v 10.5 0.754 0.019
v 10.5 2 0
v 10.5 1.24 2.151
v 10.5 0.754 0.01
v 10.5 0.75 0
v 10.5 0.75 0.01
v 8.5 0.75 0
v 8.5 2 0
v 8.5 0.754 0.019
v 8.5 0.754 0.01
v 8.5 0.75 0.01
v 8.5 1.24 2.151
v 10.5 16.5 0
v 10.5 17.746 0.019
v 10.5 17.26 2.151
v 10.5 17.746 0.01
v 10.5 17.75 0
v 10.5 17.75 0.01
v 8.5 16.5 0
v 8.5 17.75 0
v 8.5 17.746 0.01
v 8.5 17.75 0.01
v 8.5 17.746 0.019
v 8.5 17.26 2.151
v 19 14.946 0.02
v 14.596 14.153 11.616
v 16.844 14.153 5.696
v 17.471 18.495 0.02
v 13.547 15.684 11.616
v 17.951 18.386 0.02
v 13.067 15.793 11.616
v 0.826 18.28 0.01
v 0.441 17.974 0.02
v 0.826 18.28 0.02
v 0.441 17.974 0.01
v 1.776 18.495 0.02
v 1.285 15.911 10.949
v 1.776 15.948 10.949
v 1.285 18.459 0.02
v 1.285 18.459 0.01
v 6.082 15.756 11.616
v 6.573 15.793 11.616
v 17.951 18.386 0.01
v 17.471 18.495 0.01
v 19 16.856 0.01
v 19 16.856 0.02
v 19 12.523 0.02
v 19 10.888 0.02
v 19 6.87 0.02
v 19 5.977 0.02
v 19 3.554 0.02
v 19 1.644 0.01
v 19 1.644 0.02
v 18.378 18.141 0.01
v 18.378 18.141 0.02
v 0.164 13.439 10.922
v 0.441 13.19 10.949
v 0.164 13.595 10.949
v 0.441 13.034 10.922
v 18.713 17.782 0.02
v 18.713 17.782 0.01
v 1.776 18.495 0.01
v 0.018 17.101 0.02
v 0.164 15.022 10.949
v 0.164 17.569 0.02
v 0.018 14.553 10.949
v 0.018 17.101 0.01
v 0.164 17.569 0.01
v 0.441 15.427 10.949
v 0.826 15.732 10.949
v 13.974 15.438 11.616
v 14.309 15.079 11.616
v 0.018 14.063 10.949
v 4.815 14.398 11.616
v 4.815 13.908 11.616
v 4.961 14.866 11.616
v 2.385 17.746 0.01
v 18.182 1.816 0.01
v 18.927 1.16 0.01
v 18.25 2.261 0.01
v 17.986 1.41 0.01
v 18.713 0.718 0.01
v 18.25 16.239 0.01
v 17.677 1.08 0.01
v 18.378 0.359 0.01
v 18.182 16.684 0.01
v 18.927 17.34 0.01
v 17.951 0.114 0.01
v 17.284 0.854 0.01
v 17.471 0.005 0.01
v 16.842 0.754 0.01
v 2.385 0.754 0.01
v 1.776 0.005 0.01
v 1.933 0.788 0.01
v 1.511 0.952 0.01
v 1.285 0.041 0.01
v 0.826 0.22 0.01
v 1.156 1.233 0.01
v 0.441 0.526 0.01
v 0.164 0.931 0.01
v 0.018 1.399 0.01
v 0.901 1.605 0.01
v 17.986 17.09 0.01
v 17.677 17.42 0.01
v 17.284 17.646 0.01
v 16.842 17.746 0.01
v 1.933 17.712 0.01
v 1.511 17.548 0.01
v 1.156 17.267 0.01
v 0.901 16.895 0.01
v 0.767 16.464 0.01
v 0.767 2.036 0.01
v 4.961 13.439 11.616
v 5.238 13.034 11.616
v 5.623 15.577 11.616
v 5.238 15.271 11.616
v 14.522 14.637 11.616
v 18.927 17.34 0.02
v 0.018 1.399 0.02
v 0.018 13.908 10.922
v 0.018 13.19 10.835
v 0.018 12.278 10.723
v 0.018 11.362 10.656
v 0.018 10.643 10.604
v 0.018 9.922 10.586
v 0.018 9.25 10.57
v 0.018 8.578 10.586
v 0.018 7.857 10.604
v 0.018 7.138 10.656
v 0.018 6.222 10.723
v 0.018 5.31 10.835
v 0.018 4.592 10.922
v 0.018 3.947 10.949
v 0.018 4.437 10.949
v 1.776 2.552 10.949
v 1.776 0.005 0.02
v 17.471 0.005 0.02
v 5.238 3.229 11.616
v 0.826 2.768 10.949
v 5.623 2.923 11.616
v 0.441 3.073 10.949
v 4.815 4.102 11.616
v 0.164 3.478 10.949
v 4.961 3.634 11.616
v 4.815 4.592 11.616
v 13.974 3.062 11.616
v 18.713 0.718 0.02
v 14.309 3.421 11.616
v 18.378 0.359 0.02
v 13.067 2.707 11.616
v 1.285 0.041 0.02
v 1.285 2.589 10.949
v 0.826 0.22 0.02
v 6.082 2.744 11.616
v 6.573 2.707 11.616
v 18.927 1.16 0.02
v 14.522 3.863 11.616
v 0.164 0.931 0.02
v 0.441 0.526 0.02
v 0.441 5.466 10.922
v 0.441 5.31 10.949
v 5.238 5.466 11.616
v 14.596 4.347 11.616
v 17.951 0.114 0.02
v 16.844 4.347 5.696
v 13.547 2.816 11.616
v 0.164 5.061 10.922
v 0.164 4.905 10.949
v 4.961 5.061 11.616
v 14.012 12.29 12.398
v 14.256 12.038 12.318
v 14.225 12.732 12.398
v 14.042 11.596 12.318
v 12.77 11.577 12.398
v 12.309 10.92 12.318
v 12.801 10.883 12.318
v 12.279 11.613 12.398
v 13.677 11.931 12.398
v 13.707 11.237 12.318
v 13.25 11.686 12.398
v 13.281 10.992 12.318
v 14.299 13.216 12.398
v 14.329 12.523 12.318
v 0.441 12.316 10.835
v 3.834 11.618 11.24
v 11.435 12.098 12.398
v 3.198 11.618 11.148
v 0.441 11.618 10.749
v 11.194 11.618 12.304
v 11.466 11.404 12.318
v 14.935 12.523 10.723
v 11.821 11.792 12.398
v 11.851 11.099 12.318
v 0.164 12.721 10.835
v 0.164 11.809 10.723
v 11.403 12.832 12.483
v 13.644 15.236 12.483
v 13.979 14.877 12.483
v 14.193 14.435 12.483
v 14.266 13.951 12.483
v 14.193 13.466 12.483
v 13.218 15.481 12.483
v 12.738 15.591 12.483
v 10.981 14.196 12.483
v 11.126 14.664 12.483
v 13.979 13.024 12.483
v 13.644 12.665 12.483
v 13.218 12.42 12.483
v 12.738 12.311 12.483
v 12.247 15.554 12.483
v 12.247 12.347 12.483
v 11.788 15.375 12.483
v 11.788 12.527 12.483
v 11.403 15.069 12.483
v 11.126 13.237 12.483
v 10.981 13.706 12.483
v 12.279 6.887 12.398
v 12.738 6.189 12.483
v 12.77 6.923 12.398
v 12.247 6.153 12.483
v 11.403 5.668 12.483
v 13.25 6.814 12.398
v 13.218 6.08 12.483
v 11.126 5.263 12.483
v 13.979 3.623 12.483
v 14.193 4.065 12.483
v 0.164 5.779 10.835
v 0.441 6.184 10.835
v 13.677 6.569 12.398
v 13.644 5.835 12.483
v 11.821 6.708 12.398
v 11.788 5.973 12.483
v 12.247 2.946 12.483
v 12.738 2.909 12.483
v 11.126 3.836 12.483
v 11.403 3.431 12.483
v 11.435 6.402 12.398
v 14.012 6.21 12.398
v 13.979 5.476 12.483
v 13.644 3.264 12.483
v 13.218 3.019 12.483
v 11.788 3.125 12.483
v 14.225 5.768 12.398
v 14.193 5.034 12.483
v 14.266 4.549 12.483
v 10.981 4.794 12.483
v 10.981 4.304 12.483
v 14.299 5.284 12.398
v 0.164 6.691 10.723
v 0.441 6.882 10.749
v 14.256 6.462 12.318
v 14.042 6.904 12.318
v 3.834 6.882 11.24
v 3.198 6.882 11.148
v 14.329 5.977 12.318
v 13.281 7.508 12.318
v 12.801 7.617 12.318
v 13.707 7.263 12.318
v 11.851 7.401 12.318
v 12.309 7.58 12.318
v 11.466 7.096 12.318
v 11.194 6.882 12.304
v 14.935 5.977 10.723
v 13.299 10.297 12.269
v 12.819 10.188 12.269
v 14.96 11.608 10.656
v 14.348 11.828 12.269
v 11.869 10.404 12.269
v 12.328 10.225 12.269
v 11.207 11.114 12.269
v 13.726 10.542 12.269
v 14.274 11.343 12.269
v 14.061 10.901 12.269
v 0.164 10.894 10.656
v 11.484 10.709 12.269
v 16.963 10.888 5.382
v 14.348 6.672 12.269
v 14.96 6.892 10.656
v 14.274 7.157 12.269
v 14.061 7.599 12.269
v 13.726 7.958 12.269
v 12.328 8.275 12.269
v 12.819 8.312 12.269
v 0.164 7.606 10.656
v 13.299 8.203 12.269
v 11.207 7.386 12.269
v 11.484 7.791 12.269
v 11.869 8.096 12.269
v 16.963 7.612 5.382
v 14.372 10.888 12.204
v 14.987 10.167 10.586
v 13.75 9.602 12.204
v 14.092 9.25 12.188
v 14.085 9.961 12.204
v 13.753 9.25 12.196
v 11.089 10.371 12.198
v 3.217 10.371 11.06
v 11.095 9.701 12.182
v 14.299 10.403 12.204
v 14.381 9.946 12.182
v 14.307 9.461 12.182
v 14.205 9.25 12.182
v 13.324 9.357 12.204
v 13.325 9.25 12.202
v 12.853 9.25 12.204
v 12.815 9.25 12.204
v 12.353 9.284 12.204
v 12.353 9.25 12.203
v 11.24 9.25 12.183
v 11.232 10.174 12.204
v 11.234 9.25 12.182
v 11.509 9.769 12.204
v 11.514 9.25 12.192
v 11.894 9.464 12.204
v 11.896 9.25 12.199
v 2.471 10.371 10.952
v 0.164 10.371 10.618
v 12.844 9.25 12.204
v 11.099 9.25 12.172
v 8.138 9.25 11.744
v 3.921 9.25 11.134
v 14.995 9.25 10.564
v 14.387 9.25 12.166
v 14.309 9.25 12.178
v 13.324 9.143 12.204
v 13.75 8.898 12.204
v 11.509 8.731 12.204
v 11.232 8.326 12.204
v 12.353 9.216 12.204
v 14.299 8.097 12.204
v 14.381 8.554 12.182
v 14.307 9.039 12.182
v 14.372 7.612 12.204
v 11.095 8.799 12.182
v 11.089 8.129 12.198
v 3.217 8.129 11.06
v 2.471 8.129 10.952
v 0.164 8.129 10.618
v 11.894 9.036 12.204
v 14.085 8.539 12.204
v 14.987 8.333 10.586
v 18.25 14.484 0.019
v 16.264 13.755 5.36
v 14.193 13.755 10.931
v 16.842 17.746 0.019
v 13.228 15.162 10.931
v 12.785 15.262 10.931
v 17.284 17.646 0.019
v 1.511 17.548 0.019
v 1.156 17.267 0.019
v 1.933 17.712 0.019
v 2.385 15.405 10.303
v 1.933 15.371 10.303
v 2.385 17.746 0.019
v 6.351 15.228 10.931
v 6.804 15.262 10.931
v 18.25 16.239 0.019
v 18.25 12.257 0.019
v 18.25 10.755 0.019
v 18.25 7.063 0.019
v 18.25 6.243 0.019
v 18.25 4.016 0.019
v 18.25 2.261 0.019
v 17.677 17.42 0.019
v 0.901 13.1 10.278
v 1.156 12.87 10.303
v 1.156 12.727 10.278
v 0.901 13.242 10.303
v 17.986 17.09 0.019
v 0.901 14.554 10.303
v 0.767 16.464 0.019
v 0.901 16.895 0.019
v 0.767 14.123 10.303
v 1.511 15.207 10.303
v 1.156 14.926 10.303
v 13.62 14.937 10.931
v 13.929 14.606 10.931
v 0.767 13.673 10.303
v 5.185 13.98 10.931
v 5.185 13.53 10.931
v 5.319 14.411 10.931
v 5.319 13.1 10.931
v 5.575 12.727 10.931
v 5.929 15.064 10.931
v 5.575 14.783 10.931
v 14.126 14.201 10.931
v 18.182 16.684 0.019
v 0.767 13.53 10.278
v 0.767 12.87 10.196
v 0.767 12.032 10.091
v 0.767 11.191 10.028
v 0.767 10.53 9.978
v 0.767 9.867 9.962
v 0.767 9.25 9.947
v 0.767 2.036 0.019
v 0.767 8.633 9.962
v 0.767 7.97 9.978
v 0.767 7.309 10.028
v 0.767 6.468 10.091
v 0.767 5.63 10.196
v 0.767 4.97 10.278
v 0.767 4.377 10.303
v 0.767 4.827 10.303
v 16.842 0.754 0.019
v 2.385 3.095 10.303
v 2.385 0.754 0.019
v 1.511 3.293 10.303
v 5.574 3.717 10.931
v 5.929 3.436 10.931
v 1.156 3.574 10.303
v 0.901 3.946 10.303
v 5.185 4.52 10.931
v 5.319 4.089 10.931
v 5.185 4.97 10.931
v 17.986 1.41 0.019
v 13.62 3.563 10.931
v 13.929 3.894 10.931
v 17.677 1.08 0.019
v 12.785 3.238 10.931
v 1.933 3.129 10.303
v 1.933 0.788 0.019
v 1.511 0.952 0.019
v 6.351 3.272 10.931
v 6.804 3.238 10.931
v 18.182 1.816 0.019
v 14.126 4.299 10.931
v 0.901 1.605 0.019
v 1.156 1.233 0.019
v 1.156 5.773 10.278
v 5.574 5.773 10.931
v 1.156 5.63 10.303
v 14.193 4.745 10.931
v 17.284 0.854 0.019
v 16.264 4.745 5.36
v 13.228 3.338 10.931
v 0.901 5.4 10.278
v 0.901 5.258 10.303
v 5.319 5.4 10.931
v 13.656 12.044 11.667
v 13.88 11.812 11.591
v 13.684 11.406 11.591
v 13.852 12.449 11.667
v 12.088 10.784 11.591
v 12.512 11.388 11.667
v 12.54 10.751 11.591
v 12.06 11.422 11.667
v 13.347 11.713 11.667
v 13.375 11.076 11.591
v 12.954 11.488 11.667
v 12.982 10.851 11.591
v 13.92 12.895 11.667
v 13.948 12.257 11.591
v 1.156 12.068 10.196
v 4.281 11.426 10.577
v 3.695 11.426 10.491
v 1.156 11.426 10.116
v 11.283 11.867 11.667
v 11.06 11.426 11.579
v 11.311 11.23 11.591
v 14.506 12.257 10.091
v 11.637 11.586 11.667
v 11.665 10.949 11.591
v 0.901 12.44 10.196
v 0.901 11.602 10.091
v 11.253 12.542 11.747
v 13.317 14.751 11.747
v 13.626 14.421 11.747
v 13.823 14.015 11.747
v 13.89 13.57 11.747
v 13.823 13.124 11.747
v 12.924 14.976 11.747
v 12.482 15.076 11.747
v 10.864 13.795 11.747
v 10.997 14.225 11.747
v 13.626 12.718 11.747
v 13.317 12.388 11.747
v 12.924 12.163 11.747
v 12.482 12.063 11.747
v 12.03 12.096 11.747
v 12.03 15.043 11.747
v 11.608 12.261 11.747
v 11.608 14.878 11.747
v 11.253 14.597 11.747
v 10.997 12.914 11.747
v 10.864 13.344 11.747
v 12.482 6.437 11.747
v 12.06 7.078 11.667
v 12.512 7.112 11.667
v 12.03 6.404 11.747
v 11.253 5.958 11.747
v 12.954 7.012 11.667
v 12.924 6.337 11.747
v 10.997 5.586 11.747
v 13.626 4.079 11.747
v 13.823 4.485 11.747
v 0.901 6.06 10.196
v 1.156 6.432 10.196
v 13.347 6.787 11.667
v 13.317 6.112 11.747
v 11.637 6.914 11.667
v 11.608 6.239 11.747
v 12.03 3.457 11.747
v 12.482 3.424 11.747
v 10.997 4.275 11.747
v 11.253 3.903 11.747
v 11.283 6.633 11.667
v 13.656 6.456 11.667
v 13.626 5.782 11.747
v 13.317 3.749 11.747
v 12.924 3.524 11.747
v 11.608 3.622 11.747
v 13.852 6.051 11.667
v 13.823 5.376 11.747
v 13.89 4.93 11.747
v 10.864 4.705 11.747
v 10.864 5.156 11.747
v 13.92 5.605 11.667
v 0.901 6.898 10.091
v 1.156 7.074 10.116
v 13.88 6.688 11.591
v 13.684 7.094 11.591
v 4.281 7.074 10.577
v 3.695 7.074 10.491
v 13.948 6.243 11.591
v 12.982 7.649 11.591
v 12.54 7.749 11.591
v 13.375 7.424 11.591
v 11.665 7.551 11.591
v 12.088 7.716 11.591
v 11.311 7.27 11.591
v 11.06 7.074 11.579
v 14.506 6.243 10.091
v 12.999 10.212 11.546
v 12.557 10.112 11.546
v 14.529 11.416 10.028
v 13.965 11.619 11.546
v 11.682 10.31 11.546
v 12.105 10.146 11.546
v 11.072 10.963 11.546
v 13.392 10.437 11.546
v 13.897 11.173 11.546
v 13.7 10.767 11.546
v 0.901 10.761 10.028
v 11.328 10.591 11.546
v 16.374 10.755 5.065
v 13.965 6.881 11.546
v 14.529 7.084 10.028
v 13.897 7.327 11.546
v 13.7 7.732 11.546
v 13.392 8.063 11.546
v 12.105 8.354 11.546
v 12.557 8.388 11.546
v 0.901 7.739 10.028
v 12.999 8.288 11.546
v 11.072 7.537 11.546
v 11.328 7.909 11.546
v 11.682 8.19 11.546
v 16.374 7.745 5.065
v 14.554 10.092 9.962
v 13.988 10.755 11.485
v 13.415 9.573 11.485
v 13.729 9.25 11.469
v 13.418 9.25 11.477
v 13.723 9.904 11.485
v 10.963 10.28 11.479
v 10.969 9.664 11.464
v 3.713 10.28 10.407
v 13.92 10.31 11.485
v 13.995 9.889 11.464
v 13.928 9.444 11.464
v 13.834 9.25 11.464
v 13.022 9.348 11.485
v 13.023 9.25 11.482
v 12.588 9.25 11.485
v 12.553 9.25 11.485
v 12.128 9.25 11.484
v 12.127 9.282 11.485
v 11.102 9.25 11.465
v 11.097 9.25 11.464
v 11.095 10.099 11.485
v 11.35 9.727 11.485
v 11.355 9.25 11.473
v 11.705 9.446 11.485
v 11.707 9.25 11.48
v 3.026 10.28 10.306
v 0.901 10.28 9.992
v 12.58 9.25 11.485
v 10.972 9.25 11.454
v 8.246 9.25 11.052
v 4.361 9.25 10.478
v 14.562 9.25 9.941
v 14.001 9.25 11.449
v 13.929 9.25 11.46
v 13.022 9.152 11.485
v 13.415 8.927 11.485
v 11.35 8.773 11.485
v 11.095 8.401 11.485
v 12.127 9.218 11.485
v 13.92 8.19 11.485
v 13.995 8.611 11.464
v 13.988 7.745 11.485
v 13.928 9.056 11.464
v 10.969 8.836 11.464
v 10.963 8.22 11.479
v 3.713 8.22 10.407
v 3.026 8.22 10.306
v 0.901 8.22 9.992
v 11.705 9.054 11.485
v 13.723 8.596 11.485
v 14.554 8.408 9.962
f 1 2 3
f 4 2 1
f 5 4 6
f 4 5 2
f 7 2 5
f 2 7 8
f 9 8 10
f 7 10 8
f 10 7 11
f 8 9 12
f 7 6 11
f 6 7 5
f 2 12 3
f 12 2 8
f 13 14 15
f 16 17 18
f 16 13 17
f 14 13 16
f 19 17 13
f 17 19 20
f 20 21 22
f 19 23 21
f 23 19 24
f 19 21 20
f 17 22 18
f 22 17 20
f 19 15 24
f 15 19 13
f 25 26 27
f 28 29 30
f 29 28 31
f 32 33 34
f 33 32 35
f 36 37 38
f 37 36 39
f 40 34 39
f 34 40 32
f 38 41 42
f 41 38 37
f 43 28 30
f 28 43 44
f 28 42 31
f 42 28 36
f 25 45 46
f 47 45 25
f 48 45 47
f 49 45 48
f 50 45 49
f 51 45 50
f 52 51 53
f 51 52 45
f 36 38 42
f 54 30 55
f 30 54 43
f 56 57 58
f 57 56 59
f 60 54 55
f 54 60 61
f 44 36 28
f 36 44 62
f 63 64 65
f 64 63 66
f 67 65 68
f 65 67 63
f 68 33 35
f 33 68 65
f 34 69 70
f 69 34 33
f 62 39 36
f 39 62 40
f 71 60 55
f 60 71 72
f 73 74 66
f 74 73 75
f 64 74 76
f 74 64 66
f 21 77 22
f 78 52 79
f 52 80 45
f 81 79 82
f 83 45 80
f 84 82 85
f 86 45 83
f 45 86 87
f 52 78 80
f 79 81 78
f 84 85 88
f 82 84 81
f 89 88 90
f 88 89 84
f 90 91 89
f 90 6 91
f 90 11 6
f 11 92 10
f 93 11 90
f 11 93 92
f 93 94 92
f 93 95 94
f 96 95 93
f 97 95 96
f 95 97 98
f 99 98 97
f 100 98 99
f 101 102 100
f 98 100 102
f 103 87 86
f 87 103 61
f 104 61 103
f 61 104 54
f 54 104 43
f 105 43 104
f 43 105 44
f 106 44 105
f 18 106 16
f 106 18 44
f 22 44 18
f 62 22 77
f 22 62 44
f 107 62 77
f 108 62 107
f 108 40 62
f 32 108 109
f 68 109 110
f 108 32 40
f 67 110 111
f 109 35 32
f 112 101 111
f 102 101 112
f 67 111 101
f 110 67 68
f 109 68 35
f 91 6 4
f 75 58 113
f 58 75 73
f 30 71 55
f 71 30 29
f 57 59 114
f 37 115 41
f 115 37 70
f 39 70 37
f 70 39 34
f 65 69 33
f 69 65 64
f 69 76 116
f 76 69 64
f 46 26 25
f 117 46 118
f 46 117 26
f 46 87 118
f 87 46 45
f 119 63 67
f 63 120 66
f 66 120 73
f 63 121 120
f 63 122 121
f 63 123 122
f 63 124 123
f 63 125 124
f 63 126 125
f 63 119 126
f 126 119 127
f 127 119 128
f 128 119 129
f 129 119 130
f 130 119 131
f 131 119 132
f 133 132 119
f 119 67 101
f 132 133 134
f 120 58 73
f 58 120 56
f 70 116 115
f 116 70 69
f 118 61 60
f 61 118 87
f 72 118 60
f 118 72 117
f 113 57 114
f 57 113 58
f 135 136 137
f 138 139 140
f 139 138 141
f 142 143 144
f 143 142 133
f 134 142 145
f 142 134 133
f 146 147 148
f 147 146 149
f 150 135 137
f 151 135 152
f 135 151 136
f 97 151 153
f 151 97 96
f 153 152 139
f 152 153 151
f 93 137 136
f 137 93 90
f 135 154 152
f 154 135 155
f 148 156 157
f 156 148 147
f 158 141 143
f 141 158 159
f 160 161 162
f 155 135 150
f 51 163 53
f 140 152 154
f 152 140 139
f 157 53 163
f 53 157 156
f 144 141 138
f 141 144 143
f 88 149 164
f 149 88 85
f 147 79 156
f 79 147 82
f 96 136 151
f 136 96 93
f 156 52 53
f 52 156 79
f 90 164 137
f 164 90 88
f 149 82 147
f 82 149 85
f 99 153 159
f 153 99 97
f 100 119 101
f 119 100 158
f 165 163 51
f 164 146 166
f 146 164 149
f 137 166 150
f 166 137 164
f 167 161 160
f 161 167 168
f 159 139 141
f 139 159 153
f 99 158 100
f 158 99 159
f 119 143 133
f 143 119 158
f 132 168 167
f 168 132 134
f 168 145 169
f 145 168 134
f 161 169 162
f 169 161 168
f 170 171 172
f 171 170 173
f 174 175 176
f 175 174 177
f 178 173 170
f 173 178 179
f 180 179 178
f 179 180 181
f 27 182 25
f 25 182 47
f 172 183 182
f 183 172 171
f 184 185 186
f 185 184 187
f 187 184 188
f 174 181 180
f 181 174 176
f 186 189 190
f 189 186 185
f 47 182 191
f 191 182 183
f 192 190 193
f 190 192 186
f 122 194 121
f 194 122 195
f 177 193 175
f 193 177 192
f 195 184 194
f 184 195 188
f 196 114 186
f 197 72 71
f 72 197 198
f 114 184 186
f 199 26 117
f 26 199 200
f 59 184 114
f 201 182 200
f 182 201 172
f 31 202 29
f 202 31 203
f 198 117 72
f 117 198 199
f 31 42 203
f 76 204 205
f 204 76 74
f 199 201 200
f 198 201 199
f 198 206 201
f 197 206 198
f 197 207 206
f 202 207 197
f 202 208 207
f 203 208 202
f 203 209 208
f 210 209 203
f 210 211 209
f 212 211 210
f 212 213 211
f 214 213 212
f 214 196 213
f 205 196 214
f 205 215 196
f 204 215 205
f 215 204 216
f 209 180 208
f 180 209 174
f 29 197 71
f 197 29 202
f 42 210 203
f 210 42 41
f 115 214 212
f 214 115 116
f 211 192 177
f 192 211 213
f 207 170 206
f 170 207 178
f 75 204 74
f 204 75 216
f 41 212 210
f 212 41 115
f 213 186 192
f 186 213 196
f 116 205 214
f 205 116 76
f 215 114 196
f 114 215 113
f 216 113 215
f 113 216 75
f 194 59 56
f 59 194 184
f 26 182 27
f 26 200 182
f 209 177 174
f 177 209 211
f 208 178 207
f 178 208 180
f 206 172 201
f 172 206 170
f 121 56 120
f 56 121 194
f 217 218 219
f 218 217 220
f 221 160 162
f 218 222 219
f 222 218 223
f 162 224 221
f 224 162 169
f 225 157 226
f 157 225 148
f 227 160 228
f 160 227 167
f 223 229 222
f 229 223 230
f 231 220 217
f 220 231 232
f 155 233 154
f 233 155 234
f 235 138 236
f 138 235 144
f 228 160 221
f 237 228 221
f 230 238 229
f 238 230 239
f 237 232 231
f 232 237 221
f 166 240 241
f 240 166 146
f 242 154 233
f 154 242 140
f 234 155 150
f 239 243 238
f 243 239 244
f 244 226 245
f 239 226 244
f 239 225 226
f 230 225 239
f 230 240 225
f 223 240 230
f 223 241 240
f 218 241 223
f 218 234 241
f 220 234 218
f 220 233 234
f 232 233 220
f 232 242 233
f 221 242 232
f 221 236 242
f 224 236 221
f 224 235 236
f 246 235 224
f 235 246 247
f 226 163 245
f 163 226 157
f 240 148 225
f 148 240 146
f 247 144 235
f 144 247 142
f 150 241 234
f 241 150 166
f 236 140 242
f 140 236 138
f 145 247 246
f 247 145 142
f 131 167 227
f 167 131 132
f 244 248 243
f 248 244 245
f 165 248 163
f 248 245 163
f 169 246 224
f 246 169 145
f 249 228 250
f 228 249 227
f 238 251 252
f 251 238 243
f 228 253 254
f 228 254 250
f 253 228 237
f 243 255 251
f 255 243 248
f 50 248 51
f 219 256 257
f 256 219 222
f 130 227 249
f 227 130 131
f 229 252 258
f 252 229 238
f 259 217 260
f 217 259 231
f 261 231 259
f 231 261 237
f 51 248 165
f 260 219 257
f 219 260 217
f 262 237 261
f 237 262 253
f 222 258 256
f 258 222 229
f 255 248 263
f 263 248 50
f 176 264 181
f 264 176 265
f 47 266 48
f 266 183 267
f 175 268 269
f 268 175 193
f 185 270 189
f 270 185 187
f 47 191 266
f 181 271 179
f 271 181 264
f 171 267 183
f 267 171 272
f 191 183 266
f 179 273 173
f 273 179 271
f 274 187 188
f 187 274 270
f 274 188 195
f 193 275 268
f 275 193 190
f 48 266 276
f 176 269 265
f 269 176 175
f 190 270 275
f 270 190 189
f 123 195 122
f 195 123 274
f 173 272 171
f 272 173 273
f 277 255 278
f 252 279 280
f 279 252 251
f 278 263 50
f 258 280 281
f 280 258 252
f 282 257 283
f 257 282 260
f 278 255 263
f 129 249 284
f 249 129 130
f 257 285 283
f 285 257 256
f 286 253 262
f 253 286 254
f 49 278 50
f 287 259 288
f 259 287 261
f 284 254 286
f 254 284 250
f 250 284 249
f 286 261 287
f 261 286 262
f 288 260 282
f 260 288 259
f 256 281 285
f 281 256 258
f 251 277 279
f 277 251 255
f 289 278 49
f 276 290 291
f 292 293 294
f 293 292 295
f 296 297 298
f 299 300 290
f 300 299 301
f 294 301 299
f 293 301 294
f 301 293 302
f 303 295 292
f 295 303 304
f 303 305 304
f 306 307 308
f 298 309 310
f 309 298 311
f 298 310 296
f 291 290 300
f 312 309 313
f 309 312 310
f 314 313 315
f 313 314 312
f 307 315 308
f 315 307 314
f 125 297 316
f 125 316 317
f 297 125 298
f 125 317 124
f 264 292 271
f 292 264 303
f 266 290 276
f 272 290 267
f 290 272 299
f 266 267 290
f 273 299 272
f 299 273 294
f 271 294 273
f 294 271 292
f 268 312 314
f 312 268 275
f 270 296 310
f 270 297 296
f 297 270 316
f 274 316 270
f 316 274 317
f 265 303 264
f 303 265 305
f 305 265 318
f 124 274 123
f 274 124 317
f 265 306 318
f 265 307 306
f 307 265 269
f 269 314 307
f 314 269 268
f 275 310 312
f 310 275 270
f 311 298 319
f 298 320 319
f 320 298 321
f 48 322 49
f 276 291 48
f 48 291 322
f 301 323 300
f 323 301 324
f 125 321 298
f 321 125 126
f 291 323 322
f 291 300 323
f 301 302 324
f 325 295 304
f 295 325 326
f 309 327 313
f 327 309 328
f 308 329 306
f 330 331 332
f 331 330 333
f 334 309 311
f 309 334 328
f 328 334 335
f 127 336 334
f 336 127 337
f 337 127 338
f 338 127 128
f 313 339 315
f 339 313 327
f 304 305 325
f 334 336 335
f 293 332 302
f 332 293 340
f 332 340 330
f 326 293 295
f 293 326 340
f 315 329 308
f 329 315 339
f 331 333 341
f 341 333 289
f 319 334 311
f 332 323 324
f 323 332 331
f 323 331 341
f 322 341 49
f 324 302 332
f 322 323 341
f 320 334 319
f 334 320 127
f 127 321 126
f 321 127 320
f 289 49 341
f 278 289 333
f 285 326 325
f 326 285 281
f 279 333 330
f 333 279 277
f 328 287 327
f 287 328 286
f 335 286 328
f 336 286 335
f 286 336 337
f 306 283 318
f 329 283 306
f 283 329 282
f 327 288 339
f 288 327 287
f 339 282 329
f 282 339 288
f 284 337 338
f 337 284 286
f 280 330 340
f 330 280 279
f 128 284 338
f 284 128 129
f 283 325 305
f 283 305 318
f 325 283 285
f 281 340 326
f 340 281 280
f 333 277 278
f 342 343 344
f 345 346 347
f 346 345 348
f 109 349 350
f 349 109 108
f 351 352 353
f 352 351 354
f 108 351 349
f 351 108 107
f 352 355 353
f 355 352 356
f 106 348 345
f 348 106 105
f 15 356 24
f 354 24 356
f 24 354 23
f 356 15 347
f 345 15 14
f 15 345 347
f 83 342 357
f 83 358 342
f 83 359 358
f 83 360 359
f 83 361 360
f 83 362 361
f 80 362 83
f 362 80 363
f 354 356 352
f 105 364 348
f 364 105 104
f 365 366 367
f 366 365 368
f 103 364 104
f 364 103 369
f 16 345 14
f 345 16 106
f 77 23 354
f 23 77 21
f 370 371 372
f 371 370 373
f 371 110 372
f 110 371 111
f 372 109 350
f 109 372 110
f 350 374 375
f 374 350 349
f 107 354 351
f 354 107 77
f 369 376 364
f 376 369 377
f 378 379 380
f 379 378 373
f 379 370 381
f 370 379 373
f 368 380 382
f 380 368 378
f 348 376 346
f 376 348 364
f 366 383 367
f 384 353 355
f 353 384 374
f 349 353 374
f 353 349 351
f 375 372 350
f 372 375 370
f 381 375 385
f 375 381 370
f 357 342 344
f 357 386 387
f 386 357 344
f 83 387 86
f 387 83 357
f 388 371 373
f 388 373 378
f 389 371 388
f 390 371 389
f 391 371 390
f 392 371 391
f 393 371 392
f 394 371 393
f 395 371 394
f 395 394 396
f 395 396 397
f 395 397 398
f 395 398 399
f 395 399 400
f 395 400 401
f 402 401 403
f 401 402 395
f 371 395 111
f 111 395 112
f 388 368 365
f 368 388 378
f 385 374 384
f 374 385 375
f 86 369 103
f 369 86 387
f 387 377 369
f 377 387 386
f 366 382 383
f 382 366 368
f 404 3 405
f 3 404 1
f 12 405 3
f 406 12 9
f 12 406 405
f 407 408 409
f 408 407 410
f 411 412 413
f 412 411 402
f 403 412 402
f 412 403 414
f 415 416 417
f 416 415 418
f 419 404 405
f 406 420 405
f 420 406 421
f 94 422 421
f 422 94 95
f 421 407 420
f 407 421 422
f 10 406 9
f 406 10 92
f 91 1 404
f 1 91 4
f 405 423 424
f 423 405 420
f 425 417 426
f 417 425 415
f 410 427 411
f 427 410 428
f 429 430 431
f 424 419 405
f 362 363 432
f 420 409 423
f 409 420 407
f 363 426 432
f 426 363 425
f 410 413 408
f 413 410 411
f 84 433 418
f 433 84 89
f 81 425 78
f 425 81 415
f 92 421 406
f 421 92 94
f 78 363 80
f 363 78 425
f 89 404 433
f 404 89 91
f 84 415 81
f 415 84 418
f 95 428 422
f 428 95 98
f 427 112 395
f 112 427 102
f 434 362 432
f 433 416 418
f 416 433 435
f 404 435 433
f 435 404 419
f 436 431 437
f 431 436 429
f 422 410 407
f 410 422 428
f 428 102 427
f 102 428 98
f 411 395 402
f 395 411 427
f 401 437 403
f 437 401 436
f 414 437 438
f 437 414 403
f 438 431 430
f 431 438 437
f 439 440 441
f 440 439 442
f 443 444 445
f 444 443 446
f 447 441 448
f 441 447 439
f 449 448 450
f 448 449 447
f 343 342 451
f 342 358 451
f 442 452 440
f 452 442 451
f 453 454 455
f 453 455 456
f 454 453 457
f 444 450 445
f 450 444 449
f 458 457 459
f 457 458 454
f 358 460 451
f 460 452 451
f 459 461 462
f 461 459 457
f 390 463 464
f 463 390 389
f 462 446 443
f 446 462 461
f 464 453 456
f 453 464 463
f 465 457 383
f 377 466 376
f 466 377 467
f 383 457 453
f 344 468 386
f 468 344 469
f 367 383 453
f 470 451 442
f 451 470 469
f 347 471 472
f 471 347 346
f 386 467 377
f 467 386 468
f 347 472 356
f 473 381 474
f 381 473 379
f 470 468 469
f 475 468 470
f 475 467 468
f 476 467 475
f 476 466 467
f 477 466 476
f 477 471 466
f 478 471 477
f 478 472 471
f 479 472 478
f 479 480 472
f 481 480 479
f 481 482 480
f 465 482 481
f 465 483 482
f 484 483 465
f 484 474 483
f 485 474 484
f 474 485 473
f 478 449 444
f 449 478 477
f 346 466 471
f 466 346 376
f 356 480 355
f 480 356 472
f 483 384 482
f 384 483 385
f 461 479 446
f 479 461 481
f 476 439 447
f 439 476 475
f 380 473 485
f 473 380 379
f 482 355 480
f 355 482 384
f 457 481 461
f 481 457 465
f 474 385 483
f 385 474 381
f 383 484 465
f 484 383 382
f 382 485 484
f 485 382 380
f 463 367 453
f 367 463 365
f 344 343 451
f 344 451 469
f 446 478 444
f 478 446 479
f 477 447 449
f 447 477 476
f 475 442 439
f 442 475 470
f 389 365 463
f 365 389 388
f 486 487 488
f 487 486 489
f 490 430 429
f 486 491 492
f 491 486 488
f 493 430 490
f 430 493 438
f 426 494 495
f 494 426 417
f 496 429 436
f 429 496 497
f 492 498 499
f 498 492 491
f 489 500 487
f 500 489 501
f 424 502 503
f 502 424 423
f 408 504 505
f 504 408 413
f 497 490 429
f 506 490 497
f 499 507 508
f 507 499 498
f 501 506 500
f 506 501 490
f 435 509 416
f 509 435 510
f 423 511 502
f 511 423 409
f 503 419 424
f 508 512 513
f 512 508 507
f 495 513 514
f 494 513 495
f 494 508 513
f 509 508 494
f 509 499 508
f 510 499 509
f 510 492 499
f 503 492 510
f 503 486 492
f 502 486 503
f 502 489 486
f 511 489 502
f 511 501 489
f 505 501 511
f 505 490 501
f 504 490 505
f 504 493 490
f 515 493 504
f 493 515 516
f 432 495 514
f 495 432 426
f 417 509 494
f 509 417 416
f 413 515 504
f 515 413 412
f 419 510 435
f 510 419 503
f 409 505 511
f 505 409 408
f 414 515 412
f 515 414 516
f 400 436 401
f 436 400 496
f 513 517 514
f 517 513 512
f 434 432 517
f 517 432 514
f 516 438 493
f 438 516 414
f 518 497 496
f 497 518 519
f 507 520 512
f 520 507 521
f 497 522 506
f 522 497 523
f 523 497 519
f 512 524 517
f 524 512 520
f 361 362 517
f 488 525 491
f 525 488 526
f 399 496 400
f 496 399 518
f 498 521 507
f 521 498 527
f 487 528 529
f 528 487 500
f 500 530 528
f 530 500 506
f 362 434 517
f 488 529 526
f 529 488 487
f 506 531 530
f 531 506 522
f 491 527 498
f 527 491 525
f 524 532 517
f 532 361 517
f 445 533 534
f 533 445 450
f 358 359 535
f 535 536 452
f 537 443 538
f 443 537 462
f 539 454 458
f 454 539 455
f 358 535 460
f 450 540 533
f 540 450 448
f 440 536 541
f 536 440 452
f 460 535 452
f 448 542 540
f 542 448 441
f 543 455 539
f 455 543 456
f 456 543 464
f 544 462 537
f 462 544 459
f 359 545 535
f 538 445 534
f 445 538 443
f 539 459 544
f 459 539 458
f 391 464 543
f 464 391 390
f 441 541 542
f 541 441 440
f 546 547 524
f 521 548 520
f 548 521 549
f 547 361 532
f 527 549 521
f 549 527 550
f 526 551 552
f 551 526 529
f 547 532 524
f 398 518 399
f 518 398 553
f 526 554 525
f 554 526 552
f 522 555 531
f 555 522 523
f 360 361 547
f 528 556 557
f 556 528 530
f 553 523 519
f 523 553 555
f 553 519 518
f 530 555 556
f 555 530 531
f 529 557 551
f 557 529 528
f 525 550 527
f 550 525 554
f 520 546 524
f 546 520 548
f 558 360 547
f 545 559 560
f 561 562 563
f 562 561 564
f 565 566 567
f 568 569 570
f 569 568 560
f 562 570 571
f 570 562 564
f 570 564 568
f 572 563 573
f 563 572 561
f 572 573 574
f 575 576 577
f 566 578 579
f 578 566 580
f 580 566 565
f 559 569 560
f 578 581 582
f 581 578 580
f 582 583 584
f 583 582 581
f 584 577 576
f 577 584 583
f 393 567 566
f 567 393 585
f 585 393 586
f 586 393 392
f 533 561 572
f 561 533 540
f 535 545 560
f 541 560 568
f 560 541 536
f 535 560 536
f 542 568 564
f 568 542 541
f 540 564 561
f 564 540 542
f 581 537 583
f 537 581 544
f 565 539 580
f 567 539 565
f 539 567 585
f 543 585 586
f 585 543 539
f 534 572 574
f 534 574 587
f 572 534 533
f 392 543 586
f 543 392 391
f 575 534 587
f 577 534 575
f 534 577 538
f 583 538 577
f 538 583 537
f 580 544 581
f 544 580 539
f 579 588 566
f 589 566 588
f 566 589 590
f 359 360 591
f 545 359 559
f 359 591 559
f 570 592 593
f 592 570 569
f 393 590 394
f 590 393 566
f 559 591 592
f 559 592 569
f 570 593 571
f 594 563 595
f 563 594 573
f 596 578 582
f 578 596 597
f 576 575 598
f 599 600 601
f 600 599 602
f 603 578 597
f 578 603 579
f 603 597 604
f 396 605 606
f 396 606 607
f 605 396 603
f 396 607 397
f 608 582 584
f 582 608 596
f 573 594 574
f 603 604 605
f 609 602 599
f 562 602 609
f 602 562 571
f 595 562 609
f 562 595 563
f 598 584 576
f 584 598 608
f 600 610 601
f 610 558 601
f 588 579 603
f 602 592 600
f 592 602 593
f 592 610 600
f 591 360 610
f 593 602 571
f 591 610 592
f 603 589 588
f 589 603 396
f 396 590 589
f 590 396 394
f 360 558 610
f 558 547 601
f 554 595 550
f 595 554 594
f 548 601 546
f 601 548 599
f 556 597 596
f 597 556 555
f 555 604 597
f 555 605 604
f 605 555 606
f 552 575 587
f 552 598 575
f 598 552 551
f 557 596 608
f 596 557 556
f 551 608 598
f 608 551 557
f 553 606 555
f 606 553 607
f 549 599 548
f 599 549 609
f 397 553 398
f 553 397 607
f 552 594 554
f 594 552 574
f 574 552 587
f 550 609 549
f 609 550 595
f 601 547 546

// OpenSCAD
//measures are in millimeters
AY=18.5;
AX=19.0;
BY=12.5;
BLX=14.5;
EZ=11.0;
FLZ=14.0;
H=12.72;
CYL_OFF_Z=50;
CYL_DEPTH=0.1;
CLIP_X=2;
CLIP_Y=1.25;
CLIP_H=3*CLIP_Y;
CORNER_RADIUS=2;

WallThickness=0.75;
ClipWidth=2.2;
ClipDepth=0.75;

//ascfront=FLZ/sqrt(pow(FLZ,2)-pow(H,2));
//asctop=(H-EZ)/sqrt(pow(BLX,2)-pow((H-EZ),2));

alpha=asin((H-EZ)/BLX);
beta=asin(H/FLZ);
gamma=90-asin((0.5*(AY-BY))/EZ);

module keycap(){
	scale([AX/(AX+2*CORNER_RADIUS),AY/(AY+2*CORNER_RADIUS),1])
	translate([CORNER_RADIUS,CORNER_RADIUS,0.01])
	minkowski(){
		difference(){
			cube([AX,AY,H]);
			rotate(a=gamma,v=[1,0,0]) cube([100,100,100]);
			translate([0,AY,0]) rotate(a=90-gamma,v=[1,0,0]) cube([100,100,100]);
			translate([0,0,EZ]) rotate(a=-alpha,v=[0,1,0]) translate([-50,0,0]) cube([100,100,100]);
			translate([0,AY/2,EZ+CYL_OFF_Z]) rotate(a=90-alpha,v=[0,1,0]) cylinder(h=100,center=true,r=CYL_OFF_Z+CYL_DEPTH,$fa=1);
			translate([AX,0,0]) rotate(a=beta-90,v=[0,1,0]) cube([100,100,100]);
		}
		cylinder(h=0.01,r=CORNER_RADIUS,$fs=0.6);
		//rotate(a=90,v=[1,0,0]) cylinder(h=0.01,r=1,$fs=0.3);
	}
}

module clip(){
	difference(){
		cube([CLIP_X,CLIP_Y,CLIP_H]);
		translate([-1,CLIP_Y,0]) rotate(a=asin(CLIP_Y/CLIP_H),v=[1,0,0]) cube([100,100,100]);
        rotate(a=gamma, v=[1, 0, 0]) translate([-1, 0, WallThickness]) cube([100, 100, 100]);
    }
}

translate([(AX-CLIP_X)/2,WallThickness,0]) clip();
translate([0,AY,0]) mirror([0,1,0]) translate([(AX-CLIP_X)/2,WallThickness,0]) clip();

difference(){
    keycap();
    translate([WallThickness, WallThickness, 0]) scale(v=[1-2*WallThickness/AX, 1-2*WallThickness/AY, 1-WallThickness/H]) keycap();
}
